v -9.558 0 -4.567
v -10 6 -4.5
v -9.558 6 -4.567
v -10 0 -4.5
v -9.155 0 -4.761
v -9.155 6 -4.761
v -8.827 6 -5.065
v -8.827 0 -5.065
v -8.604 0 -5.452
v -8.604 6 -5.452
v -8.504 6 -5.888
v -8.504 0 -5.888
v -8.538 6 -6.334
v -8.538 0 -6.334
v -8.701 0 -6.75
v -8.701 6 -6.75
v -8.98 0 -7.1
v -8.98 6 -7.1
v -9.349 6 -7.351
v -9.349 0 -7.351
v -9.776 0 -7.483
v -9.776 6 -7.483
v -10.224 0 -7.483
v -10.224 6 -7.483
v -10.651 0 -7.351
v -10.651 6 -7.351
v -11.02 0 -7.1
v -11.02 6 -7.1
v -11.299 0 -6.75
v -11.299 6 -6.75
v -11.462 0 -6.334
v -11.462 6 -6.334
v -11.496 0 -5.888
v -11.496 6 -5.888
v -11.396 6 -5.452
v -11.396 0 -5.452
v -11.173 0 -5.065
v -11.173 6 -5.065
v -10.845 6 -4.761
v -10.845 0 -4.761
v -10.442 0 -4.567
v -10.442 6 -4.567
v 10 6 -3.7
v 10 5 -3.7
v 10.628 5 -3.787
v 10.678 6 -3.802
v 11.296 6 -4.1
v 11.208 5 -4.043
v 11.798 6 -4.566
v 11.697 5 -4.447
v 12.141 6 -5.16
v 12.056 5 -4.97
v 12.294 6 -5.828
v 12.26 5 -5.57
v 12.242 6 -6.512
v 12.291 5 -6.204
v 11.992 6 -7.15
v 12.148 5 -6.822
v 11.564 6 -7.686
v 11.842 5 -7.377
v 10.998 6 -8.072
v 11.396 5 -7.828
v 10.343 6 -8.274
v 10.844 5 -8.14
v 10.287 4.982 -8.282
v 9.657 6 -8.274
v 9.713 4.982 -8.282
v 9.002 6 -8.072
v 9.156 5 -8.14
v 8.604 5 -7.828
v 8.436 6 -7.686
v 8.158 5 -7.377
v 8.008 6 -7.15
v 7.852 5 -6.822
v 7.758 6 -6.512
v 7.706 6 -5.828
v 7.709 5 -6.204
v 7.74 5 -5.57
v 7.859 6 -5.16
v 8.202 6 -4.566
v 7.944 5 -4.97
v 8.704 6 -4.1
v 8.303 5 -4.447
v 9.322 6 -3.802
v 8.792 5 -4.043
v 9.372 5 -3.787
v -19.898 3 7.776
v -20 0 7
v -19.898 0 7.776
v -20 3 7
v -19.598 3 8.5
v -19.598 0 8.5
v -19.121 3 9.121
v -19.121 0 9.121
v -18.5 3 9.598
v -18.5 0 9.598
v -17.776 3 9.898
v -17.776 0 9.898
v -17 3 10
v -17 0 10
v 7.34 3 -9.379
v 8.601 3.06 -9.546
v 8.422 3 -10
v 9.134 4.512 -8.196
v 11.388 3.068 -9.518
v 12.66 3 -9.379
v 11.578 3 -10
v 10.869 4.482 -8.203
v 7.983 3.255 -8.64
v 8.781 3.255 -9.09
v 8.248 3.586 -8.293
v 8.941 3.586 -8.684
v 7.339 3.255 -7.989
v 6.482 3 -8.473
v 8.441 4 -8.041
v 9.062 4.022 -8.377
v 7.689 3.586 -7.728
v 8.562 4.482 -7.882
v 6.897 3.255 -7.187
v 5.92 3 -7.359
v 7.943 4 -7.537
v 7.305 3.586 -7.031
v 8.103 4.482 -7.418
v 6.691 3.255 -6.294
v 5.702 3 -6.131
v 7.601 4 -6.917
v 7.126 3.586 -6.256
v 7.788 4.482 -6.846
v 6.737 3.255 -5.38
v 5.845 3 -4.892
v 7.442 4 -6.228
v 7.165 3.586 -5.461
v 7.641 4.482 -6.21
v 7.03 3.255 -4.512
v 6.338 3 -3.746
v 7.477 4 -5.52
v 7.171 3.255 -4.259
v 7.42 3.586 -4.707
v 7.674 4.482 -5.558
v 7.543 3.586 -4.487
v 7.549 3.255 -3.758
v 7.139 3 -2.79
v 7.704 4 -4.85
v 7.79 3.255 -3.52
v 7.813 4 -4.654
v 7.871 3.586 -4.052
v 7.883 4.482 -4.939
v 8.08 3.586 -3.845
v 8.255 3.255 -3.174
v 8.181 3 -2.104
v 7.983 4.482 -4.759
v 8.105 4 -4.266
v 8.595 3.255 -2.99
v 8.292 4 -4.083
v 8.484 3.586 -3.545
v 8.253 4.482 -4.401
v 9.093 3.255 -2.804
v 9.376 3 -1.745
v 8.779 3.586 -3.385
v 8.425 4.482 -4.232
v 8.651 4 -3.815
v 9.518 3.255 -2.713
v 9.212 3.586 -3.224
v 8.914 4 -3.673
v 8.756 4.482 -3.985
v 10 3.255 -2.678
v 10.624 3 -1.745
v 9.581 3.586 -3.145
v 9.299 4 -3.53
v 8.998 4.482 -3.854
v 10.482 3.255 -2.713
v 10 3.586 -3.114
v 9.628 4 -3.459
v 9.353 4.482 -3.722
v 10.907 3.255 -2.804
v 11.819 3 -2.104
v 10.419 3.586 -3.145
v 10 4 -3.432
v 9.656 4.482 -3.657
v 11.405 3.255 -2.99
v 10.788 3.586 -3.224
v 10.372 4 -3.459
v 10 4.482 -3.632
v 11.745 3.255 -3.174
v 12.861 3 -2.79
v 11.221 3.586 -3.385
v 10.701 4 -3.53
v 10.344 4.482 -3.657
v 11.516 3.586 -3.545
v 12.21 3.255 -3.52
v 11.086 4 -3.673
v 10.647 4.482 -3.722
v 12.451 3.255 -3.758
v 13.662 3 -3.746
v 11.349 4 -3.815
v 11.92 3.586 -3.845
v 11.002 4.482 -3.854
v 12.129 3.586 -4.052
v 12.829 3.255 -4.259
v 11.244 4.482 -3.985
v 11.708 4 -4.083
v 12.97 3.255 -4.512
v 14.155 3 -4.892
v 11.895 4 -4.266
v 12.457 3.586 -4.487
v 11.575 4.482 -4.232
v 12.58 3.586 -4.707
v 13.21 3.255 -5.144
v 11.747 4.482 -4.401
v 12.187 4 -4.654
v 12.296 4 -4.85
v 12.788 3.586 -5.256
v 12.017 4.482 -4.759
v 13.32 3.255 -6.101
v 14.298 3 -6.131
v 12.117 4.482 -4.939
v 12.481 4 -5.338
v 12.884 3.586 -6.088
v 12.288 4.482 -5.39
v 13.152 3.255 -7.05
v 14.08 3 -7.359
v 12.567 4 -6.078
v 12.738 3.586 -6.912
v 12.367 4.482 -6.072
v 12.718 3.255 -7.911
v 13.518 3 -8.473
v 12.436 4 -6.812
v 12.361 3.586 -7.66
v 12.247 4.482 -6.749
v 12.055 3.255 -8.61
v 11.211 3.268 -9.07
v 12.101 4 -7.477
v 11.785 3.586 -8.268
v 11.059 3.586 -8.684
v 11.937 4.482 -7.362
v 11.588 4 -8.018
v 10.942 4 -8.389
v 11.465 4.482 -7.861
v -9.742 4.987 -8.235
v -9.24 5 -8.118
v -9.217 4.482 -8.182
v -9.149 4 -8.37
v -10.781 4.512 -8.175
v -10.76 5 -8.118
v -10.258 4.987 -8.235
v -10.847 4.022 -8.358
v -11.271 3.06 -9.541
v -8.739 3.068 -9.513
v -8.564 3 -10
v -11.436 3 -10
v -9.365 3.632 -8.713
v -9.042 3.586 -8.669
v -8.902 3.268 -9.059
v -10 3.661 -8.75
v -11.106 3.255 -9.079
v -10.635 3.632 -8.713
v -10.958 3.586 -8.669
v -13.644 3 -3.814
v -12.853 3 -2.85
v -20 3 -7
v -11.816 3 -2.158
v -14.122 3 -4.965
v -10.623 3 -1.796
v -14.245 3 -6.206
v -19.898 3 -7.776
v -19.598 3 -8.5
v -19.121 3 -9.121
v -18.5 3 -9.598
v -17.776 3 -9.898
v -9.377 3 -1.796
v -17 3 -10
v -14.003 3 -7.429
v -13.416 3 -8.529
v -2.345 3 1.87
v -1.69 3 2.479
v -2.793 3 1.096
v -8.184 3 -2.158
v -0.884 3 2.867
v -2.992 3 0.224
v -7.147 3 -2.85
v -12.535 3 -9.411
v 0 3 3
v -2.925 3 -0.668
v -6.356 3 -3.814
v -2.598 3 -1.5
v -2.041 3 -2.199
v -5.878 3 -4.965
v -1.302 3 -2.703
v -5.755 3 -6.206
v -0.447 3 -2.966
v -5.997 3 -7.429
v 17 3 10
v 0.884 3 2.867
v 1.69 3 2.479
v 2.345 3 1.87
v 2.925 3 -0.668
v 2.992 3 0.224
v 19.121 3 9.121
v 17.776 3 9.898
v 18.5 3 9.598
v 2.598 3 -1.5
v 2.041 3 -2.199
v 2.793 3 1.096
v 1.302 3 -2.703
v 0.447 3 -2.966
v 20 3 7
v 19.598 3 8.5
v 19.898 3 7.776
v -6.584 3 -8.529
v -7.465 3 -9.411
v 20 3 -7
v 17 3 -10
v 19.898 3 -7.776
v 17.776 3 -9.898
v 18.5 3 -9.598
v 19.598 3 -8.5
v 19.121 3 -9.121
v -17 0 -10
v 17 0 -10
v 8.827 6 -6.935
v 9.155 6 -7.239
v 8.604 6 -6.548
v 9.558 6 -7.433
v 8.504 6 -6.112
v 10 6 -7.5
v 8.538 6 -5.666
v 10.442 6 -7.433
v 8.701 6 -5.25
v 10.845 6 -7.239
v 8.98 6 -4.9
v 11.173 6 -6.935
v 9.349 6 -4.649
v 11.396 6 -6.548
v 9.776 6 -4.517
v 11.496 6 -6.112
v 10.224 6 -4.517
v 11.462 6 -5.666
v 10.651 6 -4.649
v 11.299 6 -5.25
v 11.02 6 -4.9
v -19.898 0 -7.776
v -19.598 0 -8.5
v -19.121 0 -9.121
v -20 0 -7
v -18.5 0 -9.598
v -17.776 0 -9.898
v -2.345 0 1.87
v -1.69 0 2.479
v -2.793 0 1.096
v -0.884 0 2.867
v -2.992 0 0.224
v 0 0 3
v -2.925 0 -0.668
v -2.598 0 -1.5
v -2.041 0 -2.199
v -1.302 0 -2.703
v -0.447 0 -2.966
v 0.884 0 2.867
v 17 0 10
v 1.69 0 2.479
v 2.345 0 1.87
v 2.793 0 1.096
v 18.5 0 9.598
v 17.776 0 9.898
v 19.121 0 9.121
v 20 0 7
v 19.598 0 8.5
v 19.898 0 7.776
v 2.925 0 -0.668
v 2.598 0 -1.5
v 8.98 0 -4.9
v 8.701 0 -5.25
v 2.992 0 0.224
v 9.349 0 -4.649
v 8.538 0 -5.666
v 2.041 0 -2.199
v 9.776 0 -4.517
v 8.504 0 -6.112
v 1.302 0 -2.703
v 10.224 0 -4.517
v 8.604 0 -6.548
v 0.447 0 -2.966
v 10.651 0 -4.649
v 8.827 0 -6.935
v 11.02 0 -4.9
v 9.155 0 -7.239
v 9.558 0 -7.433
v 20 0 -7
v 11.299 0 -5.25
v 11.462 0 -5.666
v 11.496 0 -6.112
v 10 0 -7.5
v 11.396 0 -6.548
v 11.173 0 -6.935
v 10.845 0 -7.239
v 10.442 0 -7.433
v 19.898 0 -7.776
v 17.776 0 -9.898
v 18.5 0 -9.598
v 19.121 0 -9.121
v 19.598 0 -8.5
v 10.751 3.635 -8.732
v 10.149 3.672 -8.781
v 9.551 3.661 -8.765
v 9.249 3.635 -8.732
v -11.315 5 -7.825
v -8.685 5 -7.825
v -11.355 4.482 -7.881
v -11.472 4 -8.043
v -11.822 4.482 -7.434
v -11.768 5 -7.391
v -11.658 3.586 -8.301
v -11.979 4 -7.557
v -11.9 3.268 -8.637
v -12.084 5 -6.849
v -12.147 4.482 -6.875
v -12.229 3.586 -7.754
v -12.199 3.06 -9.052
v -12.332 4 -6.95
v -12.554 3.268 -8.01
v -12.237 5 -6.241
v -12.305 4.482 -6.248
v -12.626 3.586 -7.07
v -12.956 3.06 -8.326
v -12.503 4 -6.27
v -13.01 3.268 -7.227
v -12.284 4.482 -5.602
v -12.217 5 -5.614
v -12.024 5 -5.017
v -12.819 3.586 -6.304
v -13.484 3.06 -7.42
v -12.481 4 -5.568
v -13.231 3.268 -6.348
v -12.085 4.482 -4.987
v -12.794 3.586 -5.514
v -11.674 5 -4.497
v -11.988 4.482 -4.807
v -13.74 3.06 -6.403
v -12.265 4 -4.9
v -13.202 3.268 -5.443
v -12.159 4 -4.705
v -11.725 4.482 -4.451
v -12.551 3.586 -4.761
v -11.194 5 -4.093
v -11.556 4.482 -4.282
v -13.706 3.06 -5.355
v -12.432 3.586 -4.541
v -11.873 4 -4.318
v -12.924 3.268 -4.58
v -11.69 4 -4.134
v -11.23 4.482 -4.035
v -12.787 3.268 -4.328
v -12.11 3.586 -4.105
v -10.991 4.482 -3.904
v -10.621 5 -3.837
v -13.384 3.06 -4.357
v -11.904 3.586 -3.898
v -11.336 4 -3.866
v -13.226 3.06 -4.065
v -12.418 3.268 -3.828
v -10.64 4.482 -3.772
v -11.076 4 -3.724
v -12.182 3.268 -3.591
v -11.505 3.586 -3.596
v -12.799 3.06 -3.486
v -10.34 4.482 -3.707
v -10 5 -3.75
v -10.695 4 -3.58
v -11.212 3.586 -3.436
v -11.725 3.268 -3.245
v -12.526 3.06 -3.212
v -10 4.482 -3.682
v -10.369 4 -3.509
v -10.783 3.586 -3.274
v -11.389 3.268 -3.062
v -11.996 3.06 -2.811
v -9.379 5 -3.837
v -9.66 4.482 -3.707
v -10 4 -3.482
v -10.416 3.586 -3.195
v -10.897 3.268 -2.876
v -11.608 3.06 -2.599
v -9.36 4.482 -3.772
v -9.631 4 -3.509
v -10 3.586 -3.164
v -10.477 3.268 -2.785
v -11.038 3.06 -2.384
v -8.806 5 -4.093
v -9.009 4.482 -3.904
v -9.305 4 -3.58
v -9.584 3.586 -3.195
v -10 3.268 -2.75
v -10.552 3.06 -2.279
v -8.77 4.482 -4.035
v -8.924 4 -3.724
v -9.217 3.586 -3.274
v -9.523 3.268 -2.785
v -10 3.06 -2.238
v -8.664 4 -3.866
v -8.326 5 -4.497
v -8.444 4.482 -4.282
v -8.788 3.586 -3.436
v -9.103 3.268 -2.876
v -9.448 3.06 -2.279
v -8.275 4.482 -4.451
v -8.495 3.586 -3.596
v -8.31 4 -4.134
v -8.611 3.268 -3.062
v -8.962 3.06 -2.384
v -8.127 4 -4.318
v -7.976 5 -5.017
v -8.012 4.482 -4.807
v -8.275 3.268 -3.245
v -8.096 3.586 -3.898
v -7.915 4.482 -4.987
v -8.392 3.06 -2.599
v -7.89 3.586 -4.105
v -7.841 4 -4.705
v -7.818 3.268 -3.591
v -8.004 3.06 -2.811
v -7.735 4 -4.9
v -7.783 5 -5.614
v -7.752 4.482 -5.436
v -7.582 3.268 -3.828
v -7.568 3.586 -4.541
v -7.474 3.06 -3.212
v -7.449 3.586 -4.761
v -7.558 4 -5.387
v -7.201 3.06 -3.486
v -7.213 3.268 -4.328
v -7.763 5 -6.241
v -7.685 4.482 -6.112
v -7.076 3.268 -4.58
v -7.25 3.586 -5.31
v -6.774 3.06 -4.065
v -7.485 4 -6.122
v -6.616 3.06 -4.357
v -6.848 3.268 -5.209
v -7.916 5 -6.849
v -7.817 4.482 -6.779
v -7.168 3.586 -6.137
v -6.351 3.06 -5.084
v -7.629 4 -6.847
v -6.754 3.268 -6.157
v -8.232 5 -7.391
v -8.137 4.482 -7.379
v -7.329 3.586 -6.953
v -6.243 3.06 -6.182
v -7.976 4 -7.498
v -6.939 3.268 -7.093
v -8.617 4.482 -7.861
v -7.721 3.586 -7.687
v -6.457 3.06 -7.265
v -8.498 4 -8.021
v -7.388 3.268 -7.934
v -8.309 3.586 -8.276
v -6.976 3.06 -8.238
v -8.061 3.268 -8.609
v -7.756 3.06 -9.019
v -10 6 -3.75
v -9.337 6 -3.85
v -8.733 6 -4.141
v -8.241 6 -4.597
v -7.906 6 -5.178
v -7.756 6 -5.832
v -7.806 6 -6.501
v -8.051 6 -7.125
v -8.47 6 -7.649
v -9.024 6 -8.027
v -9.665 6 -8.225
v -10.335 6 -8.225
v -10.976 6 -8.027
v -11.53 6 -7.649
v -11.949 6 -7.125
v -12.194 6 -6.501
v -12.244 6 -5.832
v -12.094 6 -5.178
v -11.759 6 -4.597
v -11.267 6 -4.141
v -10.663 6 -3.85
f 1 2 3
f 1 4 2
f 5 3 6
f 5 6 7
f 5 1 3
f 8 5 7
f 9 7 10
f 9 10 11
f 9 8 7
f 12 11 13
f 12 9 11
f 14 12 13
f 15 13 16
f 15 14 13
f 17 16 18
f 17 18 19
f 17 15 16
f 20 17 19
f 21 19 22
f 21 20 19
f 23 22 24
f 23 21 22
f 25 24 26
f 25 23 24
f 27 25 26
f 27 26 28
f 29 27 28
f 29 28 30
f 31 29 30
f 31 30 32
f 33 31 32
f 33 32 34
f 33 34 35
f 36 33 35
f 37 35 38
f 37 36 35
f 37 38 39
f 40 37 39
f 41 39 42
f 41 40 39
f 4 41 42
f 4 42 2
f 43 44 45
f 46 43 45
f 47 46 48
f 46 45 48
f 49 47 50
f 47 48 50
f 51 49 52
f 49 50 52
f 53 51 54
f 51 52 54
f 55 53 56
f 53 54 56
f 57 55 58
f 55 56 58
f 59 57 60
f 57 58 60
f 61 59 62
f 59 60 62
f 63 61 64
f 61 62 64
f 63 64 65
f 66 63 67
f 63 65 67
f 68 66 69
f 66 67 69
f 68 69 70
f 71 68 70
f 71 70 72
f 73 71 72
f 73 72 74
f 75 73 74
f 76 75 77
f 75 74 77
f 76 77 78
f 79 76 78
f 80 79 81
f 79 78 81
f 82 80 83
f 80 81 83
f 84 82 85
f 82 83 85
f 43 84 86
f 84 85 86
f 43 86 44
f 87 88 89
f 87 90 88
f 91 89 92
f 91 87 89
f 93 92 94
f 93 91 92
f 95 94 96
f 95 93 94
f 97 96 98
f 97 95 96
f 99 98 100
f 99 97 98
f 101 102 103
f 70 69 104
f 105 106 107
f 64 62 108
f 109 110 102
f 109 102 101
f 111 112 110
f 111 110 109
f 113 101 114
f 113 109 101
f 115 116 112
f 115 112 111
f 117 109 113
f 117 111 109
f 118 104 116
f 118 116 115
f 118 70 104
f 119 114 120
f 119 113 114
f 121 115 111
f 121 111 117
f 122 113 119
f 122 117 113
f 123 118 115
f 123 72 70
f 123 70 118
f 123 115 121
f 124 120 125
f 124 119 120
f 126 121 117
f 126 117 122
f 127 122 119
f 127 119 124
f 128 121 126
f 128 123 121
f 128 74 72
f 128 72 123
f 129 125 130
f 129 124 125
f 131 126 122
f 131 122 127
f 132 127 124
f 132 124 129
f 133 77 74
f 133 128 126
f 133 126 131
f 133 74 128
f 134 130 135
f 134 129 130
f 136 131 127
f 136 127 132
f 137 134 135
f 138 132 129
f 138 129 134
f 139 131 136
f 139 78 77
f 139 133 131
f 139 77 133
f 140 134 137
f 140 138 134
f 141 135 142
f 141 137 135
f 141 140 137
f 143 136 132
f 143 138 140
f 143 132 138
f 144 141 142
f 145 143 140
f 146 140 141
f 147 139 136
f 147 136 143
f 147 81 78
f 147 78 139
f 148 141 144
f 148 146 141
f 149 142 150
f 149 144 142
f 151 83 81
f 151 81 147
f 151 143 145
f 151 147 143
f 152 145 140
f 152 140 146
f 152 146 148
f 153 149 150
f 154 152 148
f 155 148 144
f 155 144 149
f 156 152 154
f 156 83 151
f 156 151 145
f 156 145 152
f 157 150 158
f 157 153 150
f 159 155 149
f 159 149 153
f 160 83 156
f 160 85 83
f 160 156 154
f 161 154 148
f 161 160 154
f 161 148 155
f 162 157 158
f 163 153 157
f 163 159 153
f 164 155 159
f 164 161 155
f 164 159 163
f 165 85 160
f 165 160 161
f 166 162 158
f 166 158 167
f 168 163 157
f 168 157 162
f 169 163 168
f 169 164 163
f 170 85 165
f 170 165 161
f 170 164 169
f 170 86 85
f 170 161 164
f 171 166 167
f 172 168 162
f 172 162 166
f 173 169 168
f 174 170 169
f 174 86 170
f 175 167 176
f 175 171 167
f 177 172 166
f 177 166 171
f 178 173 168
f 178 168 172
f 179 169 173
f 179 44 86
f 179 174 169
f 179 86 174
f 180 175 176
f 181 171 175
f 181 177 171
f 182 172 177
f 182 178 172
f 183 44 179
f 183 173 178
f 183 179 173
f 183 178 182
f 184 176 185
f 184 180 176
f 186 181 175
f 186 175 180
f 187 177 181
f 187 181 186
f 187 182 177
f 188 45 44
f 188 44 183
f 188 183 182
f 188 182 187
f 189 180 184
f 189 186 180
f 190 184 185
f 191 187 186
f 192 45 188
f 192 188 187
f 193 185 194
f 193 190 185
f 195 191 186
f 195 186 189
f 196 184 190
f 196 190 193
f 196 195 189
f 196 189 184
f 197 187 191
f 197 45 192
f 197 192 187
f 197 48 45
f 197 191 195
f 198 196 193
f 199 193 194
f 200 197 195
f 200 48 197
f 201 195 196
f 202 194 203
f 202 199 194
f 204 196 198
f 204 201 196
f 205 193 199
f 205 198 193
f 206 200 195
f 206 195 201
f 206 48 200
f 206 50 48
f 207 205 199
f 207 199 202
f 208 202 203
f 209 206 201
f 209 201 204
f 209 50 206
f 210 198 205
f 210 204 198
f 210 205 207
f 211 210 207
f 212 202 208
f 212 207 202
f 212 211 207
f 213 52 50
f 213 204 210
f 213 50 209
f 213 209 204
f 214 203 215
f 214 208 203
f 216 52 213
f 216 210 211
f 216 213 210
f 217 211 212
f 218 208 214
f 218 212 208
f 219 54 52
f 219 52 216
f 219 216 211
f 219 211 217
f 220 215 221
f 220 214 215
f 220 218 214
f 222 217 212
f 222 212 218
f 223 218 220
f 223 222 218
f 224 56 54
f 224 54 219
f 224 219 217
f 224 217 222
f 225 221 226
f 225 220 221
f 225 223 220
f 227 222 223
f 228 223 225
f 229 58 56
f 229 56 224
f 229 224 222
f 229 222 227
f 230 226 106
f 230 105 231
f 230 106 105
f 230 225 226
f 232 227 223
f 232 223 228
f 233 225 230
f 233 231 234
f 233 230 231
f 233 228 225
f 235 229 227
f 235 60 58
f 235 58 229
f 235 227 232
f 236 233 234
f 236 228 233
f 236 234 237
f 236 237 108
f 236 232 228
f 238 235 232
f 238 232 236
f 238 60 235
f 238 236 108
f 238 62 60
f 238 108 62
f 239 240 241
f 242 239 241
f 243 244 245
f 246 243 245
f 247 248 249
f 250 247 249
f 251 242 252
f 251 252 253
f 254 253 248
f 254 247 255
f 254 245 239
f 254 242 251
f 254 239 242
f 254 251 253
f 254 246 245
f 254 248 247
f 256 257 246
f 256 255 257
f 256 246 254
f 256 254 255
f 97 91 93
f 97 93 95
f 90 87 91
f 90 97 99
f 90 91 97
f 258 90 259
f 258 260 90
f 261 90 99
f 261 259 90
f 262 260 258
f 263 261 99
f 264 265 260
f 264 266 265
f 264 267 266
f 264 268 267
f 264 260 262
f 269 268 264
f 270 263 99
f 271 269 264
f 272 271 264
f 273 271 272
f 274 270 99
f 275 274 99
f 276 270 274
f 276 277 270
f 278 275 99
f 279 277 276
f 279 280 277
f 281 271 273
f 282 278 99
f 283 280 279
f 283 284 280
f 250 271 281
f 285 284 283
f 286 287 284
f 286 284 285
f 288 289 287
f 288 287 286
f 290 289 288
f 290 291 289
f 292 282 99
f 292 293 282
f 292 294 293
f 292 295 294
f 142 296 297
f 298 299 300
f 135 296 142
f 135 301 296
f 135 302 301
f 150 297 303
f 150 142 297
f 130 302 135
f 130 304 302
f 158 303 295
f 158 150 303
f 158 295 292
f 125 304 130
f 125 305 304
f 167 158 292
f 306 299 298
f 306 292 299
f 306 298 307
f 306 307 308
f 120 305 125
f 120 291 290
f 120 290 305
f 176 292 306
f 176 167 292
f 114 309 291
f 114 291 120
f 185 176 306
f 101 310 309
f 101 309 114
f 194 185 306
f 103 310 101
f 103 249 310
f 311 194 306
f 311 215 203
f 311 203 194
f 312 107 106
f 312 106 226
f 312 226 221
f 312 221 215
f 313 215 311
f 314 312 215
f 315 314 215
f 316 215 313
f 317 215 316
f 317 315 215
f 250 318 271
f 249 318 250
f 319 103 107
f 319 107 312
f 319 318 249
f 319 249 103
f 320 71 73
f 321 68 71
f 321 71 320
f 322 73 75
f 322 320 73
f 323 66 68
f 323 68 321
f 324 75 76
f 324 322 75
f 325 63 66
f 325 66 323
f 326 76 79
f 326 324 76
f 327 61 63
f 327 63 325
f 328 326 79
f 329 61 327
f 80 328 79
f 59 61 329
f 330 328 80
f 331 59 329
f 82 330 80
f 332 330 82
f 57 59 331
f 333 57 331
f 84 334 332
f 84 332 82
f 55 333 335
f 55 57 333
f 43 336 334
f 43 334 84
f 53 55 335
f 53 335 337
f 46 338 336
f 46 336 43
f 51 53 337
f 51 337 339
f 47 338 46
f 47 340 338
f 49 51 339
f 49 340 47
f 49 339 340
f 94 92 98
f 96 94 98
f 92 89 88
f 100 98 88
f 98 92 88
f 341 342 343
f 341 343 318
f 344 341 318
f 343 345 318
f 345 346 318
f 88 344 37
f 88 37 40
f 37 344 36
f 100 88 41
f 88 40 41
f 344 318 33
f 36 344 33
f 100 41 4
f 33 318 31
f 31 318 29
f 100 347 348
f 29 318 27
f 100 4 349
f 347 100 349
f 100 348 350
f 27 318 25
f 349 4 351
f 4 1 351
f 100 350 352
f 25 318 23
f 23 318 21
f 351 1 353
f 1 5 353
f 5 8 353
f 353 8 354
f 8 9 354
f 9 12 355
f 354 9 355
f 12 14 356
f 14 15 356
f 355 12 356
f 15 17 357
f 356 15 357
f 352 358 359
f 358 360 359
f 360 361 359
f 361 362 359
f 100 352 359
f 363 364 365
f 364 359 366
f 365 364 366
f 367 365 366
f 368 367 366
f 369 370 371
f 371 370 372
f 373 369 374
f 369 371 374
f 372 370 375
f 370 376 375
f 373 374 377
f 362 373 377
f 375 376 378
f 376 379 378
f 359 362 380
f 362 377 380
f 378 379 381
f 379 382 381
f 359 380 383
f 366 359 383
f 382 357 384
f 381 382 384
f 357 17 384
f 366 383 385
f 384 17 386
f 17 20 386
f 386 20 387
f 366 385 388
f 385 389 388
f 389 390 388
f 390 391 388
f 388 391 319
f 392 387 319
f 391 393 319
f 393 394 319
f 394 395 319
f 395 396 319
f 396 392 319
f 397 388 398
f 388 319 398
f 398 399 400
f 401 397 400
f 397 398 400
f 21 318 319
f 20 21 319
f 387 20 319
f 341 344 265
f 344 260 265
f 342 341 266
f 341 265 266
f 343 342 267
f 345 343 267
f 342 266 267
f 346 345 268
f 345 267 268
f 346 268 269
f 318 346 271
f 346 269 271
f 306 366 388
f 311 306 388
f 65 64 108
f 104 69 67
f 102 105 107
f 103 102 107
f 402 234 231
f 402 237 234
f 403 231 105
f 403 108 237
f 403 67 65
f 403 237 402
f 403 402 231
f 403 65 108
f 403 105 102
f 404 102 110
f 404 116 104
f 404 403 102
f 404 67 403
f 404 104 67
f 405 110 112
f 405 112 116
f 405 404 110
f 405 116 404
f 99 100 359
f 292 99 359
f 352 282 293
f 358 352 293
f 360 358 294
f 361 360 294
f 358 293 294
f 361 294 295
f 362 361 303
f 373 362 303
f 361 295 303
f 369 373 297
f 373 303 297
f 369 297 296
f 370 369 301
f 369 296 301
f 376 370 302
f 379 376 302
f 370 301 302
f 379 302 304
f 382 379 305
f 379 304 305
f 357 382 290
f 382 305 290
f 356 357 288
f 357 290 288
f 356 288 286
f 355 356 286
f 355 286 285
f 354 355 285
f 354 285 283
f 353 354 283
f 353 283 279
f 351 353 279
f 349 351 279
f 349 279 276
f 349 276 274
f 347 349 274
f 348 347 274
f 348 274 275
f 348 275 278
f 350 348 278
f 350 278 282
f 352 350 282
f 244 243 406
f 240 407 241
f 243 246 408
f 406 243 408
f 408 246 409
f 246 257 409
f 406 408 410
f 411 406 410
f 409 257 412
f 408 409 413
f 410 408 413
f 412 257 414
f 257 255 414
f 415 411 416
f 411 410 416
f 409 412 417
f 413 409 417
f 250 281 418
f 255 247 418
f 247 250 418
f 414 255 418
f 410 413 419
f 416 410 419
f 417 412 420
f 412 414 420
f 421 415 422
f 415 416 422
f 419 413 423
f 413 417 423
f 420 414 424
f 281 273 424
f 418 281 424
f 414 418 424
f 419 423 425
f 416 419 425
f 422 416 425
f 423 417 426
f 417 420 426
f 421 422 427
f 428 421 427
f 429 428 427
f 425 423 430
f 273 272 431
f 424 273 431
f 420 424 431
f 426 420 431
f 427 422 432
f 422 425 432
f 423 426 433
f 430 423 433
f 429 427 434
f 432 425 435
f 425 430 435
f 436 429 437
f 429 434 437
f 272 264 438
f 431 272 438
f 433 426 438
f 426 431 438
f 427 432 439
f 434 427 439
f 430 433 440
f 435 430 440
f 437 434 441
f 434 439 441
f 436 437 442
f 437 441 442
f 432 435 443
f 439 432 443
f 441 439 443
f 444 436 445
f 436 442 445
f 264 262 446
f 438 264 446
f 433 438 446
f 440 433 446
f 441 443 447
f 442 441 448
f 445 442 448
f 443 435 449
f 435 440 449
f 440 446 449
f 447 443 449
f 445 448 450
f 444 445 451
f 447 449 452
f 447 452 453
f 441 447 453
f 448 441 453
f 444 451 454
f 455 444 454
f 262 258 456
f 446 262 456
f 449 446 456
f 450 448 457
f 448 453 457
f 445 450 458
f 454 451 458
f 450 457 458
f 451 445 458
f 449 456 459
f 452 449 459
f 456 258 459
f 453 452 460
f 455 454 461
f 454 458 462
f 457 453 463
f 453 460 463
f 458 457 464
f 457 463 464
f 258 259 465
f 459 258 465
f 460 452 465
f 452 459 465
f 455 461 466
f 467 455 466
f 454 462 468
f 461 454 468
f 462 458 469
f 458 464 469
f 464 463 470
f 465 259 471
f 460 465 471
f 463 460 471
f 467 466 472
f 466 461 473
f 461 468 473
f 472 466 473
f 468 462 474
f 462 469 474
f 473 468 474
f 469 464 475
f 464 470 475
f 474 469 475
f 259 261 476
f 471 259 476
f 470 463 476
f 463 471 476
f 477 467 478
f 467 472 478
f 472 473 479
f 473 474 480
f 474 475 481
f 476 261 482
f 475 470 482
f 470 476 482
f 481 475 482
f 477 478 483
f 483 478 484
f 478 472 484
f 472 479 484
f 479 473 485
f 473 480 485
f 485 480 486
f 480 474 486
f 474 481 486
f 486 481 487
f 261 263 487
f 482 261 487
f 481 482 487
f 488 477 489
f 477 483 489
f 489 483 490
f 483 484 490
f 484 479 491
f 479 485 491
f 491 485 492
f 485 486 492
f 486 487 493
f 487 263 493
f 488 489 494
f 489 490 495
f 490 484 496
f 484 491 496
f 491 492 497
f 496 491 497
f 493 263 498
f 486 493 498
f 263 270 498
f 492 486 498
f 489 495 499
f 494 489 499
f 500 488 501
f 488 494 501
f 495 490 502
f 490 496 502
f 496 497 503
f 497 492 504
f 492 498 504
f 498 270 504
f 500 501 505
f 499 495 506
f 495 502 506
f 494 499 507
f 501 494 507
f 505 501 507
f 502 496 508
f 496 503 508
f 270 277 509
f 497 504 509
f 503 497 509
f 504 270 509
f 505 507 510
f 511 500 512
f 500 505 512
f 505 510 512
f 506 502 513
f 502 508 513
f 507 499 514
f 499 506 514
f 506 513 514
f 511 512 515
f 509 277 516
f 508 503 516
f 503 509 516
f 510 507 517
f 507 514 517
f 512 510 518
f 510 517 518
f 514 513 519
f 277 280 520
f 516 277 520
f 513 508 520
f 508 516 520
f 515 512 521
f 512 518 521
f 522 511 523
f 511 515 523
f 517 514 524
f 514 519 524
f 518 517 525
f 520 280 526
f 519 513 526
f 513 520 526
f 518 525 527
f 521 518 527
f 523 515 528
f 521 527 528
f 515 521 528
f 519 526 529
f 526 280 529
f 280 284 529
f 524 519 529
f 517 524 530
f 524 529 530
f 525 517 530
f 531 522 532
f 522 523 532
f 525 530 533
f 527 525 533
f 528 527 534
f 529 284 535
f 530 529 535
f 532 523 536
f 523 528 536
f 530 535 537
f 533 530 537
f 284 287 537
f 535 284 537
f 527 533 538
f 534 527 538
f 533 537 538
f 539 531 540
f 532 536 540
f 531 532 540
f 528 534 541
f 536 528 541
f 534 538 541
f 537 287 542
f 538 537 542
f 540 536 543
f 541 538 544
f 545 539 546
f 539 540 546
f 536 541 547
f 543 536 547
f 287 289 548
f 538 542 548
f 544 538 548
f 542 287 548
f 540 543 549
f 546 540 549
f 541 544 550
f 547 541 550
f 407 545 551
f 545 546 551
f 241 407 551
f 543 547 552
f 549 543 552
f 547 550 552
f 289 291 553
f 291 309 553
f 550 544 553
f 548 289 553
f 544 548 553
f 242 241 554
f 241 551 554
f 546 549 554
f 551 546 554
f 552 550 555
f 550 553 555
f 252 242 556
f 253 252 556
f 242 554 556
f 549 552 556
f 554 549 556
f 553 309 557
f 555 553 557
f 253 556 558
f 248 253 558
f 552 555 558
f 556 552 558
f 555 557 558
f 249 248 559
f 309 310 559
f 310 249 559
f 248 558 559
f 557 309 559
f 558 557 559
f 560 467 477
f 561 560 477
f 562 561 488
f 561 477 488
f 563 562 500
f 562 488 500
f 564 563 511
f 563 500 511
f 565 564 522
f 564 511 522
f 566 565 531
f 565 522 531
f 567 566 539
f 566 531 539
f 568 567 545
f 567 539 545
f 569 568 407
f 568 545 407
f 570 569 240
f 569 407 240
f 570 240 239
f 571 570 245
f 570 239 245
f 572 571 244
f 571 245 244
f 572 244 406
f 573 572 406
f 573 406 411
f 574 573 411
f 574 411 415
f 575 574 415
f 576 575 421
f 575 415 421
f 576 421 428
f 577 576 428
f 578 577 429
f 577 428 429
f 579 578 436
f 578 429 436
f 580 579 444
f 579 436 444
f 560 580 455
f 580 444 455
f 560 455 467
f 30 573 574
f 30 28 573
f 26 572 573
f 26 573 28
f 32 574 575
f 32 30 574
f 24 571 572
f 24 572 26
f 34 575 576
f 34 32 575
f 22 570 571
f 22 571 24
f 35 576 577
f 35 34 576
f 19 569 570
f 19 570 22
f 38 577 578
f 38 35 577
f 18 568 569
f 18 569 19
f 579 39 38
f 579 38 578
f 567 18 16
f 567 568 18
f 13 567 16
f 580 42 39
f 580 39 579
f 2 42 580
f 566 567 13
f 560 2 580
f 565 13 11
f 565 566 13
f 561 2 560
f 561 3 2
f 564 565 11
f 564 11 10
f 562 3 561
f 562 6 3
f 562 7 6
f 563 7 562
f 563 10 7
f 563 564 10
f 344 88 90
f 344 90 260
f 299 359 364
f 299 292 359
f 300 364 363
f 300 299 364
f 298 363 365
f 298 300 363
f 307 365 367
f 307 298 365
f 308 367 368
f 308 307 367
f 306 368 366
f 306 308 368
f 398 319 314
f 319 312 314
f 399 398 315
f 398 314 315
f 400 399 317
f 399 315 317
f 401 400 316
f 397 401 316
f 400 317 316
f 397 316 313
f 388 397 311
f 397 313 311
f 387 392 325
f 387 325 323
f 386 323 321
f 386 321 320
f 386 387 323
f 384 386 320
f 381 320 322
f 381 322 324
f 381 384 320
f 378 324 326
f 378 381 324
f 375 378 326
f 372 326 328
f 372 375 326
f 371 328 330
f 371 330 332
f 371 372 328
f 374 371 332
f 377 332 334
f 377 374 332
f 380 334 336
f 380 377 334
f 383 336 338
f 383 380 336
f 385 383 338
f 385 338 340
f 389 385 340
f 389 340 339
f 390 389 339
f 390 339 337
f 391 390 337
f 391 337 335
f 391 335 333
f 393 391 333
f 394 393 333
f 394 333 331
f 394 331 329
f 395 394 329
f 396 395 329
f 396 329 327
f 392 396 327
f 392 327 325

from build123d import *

# Parameters (mm, degrees)
SKETCH1_W           = 40
SKETCH1_H           = 20
SKETCH1_R           = 1.5
BOSS_EXTRUDE1_DEPTH = 3
FILLET1_R           = 3
SKETCH2_R           = 2.25
SKETCH2_R_2         = 1.5
SKETCH2_R_3         = 2.3
BOSS_EXTRUDE2_DEPTH = 3
SKETCH3_R           = 3
CUT_EXTRUDE1_DEPTH  = 10
FILLET2_R           = 2


with BuildPart() as part:
    # Sketch1 → Boss-Extrude1 (new body)
    with BuildSketch(Plane(origin=(0, 0, 0), x_dir=(1, 0, 0), z_dir=(0, 1, 0))):
        Rectangle(SKETCH1_W, SKETCH1_H)
        with Locations(Location((-10, 6, 0), (0, 0, 270))):
            Circle(SKETCH1_R, mode=Mode.SUBTRACT)
        with Locations(Location((10, 6, 0), (0, 0, 90))):
            Circle(SKETCH1_R, mode=Mode.SUBTRACT)
    extrude(amount=BOSS_EXTRUDE1_DEPTH)

    # Fillet1
    fillet1_edges = [part.edges().sort_by_distance(p)[0] for p in [
        (20, 1.5, 10),
        (-20, 1.5, 10),
        (-20, 1.5, -10),
        (20, 1.5, -10),
    ]]
    fillet(fillet1_edges, radius=FILLET1_R)

    # Sketch2 → Boss-Extrude2 (add)
    # profile 1 of 2: a face of its own
    with BuildSketch(Plane(origin=(0, 3, 0), x_dir=(1, 0, 0), z_dir=(0, 1, 0))):
        with Locations(Location((-10, 6, 0), (0, 0, 270))):
            Circle(SKETCH2_R)
        with Locations(Location((-10, 6, 0), (0, 0, 270))):
            Circle(SKETCH2_R_2, mode=Mode.SUBTRACT)
    # profile 2 of 2: a face of its own
    with BuildSketch(Plane(origin=(0, 3, 0), x_dir=(1, 0, 0), z_dir=(0, 1, 0))):
        with Locations(Location((10, 6, 0), (0, 0, 270))):
            Circle(SKETCH2_R_3)
        with Locations(Location((10, 6, 0), (0, 0, 90))):
            Circle(SKETCH2_R_2, mode=Mode.SUBTRACT)
    extrude(amount=BOSS_EXTRUDE2_DEPTH)

    # Sketch3 → Cut-Extrude1 (cut)
    with BuildSketch(Plane(origin=(0, 3, 0), x_dir=(1, 0, 0), z_dir=(0, 1, 0))):
        with Locations(Location((0, 0, 0), (0, 0, 270))):
            Circle(SKETCH3_R)
    extrude(amount=-CUT_EXTRUDE1_DEPTH, mode=Mode.SUBTRACT)

    # Fillet2
    fillet2_edges = [part.edges().sort_by_distance(p)[0] for p in [
        (-10, 3, -8.25),
        (10, 3, -8.3),
    ]]
    fillet(fillet2_edges, radius=FILLET2_R)


solid = part.part
